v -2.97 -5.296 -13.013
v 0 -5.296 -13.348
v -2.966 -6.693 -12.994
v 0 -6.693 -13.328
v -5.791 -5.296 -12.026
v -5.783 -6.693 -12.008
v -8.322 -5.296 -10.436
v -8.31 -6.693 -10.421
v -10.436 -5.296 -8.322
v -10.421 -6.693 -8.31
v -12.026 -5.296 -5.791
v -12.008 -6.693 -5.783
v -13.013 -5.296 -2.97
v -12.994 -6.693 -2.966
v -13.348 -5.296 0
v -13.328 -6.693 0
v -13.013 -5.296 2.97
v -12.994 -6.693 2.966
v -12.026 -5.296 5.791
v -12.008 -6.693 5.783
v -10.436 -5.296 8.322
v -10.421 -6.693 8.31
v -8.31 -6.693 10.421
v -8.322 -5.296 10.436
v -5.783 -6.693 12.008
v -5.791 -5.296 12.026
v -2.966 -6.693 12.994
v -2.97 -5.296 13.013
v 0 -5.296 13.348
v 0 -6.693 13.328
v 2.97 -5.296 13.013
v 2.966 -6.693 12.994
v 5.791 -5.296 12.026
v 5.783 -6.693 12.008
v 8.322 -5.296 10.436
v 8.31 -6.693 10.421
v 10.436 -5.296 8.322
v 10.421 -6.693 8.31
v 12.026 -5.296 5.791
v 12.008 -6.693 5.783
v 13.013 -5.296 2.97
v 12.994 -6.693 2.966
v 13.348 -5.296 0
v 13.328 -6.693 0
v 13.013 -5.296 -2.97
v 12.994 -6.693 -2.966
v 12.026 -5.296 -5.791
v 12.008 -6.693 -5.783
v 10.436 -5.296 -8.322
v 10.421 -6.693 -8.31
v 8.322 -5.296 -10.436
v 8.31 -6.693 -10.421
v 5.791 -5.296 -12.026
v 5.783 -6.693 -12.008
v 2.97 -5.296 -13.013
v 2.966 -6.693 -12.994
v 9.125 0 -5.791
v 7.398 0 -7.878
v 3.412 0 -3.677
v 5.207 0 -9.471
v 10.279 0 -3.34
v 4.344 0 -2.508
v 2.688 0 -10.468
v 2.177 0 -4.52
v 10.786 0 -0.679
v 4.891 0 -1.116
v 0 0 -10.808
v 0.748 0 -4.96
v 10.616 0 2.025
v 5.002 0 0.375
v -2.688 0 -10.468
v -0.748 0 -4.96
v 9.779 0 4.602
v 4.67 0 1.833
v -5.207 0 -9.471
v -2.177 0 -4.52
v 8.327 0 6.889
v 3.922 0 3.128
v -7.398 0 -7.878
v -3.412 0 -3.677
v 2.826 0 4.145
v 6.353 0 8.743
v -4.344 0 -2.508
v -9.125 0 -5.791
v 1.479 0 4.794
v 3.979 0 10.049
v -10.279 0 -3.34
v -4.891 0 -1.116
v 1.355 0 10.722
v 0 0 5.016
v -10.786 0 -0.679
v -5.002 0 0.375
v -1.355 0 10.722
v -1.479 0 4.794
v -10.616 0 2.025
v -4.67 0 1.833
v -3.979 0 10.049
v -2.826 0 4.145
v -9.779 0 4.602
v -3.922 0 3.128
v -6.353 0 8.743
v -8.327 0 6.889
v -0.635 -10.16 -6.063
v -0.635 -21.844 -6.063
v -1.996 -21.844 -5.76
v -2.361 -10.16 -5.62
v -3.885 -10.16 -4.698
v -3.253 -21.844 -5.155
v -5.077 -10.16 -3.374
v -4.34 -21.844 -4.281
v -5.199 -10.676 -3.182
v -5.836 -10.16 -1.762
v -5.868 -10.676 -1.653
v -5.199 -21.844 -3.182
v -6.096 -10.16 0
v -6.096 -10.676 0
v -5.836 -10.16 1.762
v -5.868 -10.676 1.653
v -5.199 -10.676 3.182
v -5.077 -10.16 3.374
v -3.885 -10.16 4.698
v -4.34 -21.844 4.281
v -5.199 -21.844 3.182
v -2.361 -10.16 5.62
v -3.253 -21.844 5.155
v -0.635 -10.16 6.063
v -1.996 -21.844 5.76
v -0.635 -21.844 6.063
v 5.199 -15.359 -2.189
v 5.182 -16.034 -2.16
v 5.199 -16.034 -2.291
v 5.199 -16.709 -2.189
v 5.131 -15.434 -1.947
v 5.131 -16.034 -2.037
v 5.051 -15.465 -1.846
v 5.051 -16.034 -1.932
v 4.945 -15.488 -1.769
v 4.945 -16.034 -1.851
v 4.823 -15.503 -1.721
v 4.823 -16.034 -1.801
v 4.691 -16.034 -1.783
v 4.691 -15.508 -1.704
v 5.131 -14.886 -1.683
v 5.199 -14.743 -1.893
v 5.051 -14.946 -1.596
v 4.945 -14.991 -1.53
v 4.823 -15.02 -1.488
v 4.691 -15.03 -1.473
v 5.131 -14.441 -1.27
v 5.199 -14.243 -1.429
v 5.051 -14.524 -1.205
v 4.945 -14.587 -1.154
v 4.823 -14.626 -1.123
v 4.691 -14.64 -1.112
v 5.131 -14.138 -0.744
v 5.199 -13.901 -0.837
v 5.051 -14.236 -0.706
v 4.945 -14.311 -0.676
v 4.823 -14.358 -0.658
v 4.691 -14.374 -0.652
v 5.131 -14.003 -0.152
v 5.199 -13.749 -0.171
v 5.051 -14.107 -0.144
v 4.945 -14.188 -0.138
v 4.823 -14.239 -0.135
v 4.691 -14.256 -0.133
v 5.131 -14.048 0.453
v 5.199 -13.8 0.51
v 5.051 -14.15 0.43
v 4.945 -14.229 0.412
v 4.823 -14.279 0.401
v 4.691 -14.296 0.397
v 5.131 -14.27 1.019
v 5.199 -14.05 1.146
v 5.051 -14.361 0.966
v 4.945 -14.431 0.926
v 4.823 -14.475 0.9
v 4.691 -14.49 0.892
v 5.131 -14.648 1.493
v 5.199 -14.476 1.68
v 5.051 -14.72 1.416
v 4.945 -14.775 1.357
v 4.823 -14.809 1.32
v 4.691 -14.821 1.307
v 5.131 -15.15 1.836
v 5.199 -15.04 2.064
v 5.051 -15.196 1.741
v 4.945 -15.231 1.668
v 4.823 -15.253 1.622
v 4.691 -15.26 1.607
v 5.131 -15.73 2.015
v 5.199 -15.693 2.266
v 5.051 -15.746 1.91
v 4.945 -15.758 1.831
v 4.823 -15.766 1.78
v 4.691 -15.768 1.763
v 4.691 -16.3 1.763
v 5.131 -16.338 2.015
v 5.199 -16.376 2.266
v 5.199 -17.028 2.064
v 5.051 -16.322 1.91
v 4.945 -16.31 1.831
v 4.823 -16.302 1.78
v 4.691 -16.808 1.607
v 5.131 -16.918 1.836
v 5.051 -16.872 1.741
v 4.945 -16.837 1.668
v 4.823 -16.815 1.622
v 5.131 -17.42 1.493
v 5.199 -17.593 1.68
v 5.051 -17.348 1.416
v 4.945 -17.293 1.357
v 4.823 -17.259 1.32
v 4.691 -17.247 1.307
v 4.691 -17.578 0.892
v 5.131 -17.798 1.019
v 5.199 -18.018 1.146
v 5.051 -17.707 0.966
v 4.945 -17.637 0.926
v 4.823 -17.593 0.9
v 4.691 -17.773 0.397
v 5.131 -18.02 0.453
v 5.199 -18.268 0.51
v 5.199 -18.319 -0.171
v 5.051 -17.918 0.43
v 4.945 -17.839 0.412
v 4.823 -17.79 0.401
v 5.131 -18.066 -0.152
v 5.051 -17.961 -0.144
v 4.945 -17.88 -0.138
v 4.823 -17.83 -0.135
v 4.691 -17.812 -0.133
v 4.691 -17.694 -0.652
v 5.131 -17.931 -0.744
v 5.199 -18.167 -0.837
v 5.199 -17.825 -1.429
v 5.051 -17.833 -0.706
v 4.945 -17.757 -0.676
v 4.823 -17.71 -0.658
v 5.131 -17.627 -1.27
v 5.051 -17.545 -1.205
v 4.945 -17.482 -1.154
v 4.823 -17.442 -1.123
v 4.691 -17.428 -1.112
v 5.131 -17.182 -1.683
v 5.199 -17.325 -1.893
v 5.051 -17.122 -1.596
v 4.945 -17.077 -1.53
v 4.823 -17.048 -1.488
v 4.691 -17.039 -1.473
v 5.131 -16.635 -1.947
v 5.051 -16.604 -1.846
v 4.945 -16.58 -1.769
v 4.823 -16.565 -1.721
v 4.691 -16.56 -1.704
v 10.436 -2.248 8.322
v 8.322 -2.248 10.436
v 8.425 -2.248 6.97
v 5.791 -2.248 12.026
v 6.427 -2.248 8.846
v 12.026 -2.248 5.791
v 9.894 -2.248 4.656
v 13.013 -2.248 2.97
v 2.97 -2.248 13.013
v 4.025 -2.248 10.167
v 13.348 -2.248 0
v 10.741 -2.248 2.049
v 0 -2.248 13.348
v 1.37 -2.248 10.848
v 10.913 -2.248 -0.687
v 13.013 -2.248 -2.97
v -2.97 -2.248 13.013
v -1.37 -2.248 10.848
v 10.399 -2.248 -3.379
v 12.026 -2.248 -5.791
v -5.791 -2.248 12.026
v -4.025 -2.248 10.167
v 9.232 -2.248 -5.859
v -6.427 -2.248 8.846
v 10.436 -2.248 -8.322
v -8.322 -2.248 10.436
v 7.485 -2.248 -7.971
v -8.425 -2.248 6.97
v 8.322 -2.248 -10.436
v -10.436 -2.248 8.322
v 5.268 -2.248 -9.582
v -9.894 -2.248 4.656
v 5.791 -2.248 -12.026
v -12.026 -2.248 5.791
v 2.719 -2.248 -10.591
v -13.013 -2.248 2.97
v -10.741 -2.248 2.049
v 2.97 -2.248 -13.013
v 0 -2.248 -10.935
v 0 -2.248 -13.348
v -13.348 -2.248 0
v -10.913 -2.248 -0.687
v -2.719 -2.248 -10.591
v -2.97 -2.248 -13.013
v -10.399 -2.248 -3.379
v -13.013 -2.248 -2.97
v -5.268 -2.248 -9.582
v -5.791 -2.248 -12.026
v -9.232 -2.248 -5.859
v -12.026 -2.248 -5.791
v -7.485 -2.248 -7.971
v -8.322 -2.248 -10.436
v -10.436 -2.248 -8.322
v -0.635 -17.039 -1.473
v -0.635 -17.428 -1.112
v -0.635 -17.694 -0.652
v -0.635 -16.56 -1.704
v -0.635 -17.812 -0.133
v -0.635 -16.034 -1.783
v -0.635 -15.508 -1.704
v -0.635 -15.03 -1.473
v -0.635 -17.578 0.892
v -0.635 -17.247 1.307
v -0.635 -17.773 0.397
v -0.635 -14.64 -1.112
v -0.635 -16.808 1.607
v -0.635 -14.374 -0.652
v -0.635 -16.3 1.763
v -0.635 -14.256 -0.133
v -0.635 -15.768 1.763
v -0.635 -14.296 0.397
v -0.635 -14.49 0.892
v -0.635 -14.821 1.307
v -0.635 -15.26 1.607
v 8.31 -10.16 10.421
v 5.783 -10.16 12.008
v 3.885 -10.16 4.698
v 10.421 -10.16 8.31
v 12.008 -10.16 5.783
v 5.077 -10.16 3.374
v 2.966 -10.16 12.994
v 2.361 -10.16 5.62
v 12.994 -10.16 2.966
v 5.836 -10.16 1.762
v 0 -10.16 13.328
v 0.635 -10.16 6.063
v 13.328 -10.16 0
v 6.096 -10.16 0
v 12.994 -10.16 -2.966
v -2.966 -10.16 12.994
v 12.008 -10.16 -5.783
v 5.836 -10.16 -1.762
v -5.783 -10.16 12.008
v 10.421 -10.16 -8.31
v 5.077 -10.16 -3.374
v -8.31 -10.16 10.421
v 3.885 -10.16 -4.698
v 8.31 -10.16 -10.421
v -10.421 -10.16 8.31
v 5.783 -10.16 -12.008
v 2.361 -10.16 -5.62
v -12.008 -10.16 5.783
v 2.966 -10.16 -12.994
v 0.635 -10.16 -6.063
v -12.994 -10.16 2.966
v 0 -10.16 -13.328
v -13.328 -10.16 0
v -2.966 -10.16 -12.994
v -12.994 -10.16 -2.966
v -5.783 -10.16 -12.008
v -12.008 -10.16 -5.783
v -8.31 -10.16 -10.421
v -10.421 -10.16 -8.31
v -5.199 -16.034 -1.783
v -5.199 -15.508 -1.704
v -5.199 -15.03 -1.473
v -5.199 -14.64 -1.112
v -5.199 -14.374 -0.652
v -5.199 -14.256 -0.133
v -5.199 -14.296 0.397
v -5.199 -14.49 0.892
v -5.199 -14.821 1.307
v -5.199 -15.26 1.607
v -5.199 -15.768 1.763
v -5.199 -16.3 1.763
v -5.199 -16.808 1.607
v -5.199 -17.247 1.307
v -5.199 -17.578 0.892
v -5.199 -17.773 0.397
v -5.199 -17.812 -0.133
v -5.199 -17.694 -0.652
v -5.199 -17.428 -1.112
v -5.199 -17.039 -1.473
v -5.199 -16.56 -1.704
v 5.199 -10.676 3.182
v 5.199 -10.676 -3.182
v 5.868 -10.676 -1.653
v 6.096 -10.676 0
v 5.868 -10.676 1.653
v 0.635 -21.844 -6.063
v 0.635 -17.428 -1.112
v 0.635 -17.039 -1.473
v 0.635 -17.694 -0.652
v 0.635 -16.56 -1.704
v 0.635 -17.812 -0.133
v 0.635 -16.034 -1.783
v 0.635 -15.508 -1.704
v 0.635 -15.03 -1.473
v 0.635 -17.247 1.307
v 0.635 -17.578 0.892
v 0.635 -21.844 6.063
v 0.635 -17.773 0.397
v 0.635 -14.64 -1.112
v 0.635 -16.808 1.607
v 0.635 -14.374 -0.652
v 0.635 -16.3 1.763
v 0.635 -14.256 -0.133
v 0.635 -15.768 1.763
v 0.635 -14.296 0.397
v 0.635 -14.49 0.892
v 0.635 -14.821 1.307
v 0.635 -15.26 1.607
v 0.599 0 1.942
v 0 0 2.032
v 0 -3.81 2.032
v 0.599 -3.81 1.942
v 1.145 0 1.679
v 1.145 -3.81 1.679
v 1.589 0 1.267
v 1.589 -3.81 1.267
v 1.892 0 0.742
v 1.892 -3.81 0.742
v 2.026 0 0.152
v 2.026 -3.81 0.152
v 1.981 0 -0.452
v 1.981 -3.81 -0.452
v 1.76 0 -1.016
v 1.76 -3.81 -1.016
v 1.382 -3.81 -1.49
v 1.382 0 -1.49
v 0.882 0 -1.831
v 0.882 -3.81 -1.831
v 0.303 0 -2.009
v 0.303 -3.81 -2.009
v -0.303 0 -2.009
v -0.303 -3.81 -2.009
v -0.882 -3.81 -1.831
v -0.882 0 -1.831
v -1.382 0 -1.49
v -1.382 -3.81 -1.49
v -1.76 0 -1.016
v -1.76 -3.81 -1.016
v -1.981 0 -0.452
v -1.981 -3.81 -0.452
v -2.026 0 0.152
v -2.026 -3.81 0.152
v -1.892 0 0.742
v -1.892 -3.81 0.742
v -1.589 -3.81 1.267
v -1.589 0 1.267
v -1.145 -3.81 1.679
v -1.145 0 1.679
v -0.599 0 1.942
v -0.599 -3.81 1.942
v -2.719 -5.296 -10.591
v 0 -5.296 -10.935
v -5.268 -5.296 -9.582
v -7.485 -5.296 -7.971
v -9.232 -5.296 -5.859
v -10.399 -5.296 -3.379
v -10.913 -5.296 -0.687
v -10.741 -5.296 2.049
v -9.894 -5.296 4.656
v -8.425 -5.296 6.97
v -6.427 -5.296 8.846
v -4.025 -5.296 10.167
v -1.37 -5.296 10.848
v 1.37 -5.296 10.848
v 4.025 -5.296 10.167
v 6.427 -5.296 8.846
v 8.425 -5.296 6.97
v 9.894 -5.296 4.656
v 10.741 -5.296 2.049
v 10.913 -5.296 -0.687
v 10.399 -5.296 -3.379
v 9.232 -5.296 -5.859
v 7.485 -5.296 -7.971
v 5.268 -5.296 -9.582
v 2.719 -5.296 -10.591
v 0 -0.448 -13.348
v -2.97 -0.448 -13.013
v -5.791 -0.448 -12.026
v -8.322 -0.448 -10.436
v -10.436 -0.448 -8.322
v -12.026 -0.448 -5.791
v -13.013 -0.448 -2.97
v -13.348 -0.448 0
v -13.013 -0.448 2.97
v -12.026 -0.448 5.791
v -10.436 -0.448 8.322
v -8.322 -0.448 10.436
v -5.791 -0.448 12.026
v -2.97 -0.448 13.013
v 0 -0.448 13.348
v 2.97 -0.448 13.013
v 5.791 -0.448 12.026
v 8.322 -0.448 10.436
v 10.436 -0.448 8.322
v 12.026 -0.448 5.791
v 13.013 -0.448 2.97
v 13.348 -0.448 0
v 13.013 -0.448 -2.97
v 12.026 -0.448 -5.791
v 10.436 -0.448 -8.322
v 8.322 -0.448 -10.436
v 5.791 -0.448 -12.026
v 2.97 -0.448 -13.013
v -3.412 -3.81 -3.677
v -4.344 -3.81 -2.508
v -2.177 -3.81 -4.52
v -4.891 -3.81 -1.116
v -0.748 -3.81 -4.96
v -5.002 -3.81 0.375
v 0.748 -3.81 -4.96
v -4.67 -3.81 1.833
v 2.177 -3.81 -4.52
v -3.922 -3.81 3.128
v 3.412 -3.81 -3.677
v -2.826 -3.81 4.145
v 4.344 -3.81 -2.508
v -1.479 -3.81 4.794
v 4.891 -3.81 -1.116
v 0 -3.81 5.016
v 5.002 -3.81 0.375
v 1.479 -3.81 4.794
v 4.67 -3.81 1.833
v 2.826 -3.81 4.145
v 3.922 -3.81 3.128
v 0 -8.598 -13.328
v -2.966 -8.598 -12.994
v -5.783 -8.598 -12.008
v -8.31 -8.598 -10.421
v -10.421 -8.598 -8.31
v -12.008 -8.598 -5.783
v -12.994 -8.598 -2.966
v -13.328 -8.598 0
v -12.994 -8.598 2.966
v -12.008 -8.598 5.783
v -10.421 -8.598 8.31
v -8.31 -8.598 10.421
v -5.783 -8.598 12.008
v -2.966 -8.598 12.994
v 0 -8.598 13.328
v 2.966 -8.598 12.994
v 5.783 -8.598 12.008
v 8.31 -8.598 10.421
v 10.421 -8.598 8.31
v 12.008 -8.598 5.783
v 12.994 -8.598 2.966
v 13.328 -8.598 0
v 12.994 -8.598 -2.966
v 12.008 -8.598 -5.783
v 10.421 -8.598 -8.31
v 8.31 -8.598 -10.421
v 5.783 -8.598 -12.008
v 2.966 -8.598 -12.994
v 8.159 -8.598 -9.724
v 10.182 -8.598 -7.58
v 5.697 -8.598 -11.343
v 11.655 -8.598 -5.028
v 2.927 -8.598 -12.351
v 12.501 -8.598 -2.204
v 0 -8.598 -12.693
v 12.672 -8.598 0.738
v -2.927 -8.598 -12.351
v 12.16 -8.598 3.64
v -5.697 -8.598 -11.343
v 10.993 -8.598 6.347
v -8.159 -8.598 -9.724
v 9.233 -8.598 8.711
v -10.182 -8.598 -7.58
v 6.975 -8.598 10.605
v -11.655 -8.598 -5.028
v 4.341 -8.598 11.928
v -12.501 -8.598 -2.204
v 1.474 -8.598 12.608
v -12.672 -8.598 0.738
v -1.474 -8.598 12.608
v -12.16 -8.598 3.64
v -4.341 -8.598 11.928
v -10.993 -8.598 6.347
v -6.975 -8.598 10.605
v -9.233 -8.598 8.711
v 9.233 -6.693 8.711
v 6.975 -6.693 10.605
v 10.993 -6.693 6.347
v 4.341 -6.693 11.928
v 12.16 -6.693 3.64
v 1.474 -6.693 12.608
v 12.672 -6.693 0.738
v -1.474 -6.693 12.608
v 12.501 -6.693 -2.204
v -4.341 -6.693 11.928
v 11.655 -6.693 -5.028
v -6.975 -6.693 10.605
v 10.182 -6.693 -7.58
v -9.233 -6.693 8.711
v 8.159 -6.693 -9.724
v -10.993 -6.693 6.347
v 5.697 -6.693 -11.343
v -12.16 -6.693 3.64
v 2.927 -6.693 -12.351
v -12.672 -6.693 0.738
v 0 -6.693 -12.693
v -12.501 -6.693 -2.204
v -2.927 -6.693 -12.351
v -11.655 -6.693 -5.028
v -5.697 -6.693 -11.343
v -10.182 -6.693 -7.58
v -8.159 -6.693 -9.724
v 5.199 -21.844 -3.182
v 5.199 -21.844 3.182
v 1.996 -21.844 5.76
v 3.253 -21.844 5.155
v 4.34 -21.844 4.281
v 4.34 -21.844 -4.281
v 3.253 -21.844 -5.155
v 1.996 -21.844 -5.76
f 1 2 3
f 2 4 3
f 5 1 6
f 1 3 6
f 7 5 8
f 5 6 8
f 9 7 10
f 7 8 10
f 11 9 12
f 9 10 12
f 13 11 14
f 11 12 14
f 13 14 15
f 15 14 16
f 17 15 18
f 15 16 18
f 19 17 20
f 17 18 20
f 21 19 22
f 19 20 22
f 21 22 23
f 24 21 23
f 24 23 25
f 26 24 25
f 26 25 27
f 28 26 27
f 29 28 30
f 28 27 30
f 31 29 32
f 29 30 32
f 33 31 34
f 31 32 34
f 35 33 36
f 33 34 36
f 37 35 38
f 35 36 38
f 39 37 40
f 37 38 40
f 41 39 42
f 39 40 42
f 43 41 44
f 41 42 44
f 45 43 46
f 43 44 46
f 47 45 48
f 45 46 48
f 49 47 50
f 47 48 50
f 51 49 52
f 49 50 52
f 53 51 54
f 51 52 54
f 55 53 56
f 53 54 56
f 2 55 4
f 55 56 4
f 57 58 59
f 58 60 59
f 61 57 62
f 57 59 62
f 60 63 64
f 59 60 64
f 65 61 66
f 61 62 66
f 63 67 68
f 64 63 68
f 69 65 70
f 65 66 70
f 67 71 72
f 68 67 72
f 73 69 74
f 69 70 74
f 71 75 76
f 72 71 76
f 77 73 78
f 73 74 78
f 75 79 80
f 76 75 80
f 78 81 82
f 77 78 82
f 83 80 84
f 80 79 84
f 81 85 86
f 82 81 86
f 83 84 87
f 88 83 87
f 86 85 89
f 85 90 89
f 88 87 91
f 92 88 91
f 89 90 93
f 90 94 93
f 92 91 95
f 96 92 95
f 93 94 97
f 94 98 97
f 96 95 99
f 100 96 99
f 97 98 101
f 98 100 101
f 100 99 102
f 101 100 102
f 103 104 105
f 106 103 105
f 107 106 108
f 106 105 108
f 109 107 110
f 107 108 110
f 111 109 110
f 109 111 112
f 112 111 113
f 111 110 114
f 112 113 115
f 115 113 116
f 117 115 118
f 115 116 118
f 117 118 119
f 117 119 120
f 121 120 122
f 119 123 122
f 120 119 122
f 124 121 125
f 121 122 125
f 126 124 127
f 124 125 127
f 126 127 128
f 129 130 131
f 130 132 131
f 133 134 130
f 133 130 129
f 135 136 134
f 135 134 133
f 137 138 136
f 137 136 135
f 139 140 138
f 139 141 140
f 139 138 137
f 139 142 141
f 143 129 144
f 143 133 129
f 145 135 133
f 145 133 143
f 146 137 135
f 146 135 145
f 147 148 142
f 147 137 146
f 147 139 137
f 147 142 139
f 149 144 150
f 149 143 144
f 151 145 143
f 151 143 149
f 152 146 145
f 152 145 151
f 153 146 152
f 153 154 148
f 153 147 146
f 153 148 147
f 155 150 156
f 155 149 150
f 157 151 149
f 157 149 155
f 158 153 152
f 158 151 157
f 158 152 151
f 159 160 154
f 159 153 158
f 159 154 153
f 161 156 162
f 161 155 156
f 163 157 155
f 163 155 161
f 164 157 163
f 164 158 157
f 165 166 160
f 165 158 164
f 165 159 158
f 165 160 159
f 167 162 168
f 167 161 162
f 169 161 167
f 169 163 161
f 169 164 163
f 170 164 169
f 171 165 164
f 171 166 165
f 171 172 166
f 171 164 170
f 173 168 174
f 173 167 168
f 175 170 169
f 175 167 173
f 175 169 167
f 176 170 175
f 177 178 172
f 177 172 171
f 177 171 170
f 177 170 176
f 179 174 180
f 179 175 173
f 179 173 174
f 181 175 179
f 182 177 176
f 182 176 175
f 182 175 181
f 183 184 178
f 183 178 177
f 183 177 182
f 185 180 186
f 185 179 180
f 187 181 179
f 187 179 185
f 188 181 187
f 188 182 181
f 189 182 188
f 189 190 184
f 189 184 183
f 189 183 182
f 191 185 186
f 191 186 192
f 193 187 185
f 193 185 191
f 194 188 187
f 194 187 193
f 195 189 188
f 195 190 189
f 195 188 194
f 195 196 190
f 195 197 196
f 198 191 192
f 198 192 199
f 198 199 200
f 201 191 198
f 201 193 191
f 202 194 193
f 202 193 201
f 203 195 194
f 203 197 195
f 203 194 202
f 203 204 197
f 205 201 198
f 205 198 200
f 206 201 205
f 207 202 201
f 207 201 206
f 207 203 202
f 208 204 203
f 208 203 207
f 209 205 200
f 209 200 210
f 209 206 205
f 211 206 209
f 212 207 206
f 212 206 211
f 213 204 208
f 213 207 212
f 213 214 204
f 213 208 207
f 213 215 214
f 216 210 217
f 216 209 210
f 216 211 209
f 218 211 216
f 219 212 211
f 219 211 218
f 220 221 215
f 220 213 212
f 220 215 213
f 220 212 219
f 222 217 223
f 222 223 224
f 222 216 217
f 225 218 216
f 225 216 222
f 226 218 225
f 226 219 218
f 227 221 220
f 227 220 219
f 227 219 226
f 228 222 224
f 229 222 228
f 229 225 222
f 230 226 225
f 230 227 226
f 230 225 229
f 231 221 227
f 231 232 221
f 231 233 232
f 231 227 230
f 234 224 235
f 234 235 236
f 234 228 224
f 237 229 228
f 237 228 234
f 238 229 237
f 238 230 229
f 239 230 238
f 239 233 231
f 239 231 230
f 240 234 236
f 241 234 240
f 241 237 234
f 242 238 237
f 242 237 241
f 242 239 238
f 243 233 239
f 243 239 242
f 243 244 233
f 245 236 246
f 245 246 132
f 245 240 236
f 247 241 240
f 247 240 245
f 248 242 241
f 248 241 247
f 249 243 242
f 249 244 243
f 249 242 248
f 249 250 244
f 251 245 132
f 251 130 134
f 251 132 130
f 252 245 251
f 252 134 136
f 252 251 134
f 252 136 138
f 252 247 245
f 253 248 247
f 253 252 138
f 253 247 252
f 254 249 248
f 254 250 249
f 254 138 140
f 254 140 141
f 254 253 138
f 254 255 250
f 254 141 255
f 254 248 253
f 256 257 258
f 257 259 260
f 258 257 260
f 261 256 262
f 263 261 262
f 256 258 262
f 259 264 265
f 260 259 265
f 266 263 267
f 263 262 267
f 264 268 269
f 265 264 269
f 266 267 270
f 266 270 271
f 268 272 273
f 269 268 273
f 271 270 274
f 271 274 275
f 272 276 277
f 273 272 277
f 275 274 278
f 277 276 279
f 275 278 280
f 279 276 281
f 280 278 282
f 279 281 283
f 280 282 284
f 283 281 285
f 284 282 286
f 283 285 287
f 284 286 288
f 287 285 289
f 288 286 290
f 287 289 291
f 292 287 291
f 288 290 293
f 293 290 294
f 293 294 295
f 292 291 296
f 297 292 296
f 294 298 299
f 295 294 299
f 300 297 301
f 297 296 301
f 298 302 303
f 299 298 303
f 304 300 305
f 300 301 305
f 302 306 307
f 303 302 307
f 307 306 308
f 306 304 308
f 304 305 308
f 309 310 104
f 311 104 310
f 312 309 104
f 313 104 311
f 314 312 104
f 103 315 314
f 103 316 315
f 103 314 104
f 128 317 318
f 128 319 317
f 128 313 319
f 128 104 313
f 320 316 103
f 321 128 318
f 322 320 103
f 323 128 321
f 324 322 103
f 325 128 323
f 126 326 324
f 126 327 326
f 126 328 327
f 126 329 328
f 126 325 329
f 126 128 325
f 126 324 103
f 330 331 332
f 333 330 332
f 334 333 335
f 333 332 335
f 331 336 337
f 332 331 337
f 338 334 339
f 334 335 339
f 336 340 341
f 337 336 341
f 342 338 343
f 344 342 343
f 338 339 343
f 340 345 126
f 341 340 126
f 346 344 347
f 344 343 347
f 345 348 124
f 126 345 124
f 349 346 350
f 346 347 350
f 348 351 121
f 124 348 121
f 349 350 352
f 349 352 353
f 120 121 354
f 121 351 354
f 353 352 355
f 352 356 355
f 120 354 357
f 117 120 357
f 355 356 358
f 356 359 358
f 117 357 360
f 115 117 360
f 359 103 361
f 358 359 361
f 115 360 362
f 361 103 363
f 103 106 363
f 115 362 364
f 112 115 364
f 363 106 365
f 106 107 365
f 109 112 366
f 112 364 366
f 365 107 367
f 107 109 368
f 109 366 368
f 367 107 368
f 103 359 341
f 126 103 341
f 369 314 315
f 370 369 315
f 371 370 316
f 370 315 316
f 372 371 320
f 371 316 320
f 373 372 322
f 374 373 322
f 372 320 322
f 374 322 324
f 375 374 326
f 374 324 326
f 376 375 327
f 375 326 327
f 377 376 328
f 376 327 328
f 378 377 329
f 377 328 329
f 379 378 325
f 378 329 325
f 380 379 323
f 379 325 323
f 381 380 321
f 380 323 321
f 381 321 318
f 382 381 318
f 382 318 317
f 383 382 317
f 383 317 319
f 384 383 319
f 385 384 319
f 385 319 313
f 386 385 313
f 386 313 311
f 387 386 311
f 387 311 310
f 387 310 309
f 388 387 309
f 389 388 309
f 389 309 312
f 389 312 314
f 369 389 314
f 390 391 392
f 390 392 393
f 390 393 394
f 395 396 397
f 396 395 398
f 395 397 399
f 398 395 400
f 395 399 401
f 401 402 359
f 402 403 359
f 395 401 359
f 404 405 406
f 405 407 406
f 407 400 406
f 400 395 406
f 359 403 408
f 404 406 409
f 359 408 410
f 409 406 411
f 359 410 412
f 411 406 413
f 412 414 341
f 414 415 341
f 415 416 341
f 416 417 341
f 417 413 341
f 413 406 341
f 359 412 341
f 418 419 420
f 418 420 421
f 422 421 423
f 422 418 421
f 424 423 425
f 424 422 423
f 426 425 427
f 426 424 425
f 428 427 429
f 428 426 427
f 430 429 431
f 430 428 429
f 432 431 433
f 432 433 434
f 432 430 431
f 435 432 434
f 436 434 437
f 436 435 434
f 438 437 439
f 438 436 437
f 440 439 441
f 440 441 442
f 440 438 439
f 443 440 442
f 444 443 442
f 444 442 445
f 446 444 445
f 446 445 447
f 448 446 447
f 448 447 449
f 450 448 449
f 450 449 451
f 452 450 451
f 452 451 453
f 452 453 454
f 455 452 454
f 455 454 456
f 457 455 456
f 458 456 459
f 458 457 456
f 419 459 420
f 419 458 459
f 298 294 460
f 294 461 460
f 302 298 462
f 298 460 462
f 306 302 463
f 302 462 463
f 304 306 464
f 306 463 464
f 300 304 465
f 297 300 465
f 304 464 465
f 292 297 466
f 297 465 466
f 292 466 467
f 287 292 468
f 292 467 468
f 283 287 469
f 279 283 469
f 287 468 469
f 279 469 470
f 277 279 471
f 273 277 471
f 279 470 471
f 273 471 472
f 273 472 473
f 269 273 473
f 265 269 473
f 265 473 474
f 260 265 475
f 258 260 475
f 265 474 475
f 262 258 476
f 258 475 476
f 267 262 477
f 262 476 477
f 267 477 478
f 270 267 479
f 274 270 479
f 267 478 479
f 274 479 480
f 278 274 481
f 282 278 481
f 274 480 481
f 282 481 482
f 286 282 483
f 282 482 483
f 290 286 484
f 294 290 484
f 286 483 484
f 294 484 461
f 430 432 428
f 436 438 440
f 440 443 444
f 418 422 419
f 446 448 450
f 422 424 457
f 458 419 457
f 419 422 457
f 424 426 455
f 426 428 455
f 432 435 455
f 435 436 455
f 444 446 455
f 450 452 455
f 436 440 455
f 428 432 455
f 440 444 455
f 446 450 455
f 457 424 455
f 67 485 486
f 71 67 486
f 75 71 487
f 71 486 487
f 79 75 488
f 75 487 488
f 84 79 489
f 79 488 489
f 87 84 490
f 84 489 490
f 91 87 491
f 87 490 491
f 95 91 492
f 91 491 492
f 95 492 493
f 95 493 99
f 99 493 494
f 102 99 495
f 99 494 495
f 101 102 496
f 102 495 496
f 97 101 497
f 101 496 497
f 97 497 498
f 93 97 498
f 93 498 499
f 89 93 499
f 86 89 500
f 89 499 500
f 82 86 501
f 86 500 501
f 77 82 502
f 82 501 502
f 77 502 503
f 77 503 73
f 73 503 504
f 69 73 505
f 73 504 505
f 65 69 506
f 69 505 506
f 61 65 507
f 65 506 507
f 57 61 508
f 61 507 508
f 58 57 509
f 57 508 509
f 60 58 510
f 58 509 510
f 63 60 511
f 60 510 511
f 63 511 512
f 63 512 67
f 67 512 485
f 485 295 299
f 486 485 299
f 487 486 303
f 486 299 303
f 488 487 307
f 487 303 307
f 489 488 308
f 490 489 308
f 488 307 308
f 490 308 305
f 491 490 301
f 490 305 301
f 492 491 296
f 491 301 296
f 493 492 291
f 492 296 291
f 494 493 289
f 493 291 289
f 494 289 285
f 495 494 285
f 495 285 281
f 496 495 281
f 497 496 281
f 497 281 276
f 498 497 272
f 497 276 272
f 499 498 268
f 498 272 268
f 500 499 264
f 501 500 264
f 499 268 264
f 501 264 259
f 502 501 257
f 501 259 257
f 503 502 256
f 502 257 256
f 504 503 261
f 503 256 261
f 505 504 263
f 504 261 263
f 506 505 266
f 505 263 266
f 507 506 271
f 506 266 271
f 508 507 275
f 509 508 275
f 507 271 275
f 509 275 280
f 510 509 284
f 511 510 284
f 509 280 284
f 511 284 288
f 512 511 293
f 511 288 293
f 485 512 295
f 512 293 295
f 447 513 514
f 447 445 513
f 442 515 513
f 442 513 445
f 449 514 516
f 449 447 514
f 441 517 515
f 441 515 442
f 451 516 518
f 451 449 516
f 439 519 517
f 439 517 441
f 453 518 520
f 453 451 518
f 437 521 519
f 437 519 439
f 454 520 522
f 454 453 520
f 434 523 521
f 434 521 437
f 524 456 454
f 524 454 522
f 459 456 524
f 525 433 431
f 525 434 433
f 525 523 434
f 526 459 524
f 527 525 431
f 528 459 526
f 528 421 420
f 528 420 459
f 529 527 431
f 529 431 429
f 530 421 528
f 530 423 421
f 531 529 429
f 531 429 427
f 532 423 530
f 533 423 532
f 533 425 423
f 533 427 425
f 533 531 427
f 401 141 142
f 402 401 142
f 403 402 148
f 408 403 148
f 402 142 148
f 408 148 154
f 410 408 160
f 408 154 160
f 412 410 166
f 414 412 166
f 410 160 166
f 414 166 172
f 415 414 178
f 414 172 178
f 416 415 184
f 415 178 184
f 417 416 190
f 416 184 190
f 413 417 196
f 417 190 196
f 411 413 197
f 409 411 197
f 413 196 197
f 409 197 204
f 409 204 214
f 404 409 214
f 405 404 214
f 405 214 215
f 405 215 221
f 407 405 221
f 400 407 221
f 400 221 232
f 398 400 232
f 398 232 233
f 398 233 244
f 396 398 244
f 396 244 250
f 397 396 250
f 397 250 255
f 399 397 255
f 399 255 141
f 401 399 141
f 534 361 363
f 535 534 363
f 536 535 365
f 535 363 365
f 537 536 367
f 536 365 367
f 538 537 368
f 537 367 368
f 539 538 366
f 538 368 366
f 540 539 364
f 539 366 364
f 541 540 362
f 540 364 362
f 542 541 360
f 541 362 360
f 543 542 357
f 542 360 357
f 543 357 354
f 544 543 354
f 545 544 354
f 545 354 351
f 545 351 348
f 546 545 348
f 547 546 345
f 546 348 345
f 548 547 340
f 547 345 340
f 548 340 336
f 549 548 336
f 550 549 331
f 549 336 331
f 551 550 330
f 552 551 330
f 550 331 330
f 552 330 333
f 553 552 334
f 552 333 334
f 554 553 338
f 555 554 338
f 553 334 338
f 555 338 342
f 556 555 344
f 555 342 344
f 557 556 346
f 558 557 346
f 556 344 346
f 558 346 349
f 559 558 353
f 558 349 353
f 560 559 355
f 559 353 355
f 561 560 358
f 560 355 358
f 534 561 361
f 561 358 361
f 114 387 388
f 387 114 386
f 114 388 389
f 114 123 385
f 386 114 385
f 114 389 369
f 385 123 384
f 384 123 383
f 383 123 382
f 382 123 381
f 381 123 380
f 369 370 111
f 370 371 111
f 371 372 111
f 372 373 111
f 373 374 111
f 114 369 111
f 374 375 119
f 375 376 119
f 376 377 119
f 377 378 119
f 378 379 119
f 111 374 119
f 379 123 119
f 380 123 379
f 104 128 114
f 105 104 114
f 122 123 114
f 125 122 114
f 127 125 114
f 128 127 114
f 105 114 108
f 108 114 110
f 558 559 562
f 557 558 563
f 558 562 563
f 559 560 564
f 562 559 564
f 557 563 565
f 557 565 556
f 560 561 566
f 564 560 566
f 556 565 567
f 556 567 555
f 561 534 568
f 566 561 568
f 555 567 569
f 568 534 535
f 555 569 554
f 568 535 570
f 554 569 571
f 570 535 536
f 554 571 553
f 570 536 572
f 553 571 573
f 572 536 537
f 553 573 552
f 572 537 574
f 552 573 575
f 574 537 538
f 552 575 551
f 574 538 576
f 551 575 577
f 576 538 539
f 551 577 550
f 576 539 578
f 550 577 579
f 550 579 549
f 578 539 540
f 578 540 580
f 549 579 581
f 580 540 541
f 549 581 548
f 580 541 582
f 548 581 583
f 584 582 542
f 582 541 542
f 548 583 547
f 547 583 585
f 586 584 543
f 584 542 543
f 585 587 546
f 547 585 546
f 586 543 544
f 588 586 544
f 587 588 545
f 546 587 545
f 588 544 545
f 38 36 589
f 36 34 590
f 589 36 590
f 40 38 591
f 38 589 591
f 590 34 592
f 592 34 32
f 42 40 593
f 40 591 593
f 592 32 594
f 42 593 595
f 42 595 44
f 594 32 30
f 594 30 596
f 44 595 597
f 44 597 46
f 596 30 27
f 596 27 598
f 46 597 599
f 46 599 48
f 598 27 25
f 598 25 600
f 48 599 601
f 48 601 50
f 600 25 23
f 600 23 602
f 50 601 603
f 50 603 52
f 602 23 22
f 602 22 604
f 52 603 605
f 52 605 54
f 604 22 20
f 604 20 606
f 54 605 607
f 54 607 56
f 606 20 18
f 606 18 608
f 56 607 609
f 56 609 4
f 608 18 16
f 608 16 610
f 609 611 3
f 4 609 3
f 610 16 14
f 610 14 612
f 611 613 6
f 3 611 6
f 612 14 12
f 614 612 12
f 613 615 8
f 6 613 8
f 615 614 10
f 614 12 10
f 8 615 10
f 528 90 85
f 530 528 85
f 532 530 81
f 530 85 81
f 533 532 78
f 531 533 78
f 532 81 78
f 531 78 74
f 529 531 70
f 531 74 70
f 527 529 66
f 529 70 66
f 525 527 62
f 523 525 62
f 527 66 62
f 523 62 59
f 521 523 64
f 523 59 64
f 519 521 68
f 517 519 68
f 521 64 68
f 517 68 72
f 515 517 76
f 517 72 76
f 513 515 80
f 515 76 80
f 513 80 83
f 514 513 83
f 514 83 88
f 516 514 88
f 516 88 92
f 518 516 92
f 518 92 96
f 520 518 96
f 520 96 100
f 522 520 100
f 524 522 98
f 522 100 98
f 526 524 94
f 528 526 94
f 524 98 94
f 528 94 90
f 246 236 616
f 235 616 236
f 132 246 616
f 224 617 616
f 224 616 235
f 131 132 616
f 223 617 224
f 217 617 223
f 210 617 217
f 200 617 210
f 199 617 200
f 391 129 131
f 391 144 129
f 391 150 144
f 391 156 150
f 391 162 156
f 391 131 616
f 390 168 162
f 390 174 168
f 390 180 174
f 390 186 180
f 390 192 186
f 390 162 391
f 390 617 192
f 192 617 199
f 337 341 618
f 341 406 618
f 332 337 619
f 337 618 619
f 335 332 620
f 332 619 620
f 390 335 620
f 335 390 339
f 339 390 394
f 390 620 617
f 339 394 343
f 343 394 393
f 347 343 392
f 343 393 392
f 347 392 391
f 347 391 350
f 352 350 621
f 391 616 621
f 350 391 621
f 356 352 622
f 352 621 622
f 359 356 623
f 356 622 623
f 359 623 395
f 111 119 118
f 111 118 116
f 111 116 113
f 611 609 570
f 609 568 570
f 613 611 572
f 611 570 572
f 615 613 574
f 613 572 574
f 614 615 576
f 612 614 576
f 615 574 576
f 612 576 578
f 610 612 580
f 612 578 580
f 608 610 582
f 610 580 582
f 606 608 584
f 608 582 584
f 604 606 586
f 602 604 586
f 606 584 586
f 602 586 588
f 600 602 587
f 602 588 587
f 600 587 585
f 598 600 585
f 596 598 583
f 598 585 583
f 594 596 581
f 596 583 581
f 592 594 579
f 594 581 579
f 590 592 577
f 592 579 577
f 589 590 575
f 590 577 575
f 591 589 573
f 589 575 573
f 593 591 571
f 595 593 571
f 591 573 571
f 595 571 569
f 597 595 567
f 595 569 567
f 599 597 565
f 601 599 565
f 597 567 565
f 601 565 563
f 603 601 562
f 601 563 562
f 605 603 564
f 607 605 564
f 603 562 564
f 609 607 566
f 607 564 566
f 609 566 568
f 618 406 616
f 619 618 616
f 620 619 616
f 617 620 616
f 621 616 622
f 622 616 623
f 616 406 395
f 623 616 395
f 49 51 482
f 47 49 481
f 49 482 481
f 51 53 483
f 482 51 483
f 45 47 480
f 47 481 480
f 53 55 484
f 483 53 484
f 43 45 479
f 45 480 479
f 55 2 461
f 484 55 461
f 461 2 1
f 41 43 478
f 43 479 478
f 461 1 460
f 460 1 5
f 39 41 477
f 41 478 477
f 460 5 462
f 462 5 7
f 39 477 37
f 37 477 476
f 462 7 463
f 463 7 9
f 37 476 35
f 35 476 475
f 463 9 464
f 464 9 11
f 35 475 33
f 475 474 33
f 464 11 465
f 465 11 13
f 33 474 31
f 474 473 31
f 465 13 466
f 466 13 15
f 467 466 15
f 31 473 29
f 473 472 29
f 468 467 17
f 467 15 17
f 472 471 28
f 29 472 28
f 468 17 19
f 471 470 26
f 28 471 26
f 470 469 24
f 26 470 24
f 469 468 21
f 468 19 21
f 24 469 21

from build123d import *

# Parameters (mm, degrees)
CHAMFER1_SIZE      = 2.54
CHAMFER1_SIZE2     = 0.447870531
SKETCH3_W          = 1.27
SKETCH3_H          = 11.684
SKETCH3_W_2        = 0.896537977
SKETCH3_H_2        = 11.167643875
CUT_EXTRUDE2_DEPTH = 25.4
SKETCH4_R          = 1.783288569
CUT_EXTRUDE3_DEPTH = 32.616251091
FILLET1_R          = 0.508
SKETCH5_R          = 5.0165
SKETCH5_R_2        = 2.032
CUT_EXTRUDE4_DEPTH = 3.81


with BuildPart() as part:
    # Sketch1 → Revolve1 (revolve)
    with BuildSketch(Plane.XY, mode=Mode.PRIVATE) as revolve1_sk:
        Polygon((0, 0), (13.34752775, 0), (13.34752775, -2.248031717), (10.93452775, -2.248031717), (10.93452775, -5.296031717), (13.34752775, -5.296031717), (13.328344425, -6.6929), (12.693344425, -6.6929), (12.693344425, -8.5979), (13.328344425, -8.5979), (13.328344425, -10.16), (6.096, -10.16), (6.096, -21.844), (0, -21.844), (0, -10.16), align=None)
    revolve(revolve1_sk.sketch.rotate(Axis((0, 0, 0), (0, 1, 0)), 90), axis=Axis((0, 0, 0), (0, 1, 0)))

    # Chamfer1
    chamfer1_edges = [part.edges().sort_by_distance(p)[0] for p in [
        (0, 0, 13.34752775),
    ]]
    chamfer1_side = [part.faces().sort_by_distance(p)[0] for p in [
        (0, 0, 0),
    ]]
    chamfer(chamfer1_edges, length=CHAMFER1_SIZE, length2=CHAMFER1_SIZE2, reference=chamfer1_side[0])

    # Sketch3 → Cut-Extrude2 (cut)
    with BuildSketch(Plane.XY.offset(13.335)):
        with Locations((0, -16.002)):
            Rectangle(SKETCH3_W, SKETCH3_H)
        with Locations((5.647731012, -16.260178062)):
            Rectangle(SKETCH3_W_2, SKETCH3_H_2)
        with Locations((-5.647731012, -16.260178062)):
            Rectangle(SKETCH3_W_2, SKETCH3_H_2)
    extrude(amount=-CUT_EXTRUDE2_DEPTH, mode=Mode.SUBTRACT)

    # Sketch4 → Cut-Extrude3 (cut, through all)
    with BuildSketch(Plane(origin=(5.207, 0, 0), x_dir=(0, 0, -1), z_dir=(1, 0, 0))):
        with Locations((0, -16.034094945)):
            Circle(SKETCH4_R)
    extrude(amount=-CUT_EXTRUDE3_DEPTH, mode=Mode.SUBTRACT)

    # Fillet1
    fillet1_edges = [part.edges().sort_by_distance(p)[0] for p in [
        (5.199462023, -16.034094945, 1.783288569),
    ]]
    fillet(fillet1_edges, radius=FILLET1_R)

    # Sketch5 → Cut-Extrude4 (cut)
    with BuildSketch(Plane(origin=(0, 0, 0), x_dir=(1, 0, 0), z_dir=(0, 1, 0))):
        with Locations(Location((0, 0, 0), (0, 0, 270))):
            Circle(SKETCH5_R)
        with Locations(Location((0, 0, 0), (0, 0, 270))):
            Circle(SKETCH5_R_2, mode=Mode.SUBTRACT)
    extrude(amount=-CUT_EXTRUDE4_DEPTH, mode=Mode.SUBTRACT)


solid = part.part
